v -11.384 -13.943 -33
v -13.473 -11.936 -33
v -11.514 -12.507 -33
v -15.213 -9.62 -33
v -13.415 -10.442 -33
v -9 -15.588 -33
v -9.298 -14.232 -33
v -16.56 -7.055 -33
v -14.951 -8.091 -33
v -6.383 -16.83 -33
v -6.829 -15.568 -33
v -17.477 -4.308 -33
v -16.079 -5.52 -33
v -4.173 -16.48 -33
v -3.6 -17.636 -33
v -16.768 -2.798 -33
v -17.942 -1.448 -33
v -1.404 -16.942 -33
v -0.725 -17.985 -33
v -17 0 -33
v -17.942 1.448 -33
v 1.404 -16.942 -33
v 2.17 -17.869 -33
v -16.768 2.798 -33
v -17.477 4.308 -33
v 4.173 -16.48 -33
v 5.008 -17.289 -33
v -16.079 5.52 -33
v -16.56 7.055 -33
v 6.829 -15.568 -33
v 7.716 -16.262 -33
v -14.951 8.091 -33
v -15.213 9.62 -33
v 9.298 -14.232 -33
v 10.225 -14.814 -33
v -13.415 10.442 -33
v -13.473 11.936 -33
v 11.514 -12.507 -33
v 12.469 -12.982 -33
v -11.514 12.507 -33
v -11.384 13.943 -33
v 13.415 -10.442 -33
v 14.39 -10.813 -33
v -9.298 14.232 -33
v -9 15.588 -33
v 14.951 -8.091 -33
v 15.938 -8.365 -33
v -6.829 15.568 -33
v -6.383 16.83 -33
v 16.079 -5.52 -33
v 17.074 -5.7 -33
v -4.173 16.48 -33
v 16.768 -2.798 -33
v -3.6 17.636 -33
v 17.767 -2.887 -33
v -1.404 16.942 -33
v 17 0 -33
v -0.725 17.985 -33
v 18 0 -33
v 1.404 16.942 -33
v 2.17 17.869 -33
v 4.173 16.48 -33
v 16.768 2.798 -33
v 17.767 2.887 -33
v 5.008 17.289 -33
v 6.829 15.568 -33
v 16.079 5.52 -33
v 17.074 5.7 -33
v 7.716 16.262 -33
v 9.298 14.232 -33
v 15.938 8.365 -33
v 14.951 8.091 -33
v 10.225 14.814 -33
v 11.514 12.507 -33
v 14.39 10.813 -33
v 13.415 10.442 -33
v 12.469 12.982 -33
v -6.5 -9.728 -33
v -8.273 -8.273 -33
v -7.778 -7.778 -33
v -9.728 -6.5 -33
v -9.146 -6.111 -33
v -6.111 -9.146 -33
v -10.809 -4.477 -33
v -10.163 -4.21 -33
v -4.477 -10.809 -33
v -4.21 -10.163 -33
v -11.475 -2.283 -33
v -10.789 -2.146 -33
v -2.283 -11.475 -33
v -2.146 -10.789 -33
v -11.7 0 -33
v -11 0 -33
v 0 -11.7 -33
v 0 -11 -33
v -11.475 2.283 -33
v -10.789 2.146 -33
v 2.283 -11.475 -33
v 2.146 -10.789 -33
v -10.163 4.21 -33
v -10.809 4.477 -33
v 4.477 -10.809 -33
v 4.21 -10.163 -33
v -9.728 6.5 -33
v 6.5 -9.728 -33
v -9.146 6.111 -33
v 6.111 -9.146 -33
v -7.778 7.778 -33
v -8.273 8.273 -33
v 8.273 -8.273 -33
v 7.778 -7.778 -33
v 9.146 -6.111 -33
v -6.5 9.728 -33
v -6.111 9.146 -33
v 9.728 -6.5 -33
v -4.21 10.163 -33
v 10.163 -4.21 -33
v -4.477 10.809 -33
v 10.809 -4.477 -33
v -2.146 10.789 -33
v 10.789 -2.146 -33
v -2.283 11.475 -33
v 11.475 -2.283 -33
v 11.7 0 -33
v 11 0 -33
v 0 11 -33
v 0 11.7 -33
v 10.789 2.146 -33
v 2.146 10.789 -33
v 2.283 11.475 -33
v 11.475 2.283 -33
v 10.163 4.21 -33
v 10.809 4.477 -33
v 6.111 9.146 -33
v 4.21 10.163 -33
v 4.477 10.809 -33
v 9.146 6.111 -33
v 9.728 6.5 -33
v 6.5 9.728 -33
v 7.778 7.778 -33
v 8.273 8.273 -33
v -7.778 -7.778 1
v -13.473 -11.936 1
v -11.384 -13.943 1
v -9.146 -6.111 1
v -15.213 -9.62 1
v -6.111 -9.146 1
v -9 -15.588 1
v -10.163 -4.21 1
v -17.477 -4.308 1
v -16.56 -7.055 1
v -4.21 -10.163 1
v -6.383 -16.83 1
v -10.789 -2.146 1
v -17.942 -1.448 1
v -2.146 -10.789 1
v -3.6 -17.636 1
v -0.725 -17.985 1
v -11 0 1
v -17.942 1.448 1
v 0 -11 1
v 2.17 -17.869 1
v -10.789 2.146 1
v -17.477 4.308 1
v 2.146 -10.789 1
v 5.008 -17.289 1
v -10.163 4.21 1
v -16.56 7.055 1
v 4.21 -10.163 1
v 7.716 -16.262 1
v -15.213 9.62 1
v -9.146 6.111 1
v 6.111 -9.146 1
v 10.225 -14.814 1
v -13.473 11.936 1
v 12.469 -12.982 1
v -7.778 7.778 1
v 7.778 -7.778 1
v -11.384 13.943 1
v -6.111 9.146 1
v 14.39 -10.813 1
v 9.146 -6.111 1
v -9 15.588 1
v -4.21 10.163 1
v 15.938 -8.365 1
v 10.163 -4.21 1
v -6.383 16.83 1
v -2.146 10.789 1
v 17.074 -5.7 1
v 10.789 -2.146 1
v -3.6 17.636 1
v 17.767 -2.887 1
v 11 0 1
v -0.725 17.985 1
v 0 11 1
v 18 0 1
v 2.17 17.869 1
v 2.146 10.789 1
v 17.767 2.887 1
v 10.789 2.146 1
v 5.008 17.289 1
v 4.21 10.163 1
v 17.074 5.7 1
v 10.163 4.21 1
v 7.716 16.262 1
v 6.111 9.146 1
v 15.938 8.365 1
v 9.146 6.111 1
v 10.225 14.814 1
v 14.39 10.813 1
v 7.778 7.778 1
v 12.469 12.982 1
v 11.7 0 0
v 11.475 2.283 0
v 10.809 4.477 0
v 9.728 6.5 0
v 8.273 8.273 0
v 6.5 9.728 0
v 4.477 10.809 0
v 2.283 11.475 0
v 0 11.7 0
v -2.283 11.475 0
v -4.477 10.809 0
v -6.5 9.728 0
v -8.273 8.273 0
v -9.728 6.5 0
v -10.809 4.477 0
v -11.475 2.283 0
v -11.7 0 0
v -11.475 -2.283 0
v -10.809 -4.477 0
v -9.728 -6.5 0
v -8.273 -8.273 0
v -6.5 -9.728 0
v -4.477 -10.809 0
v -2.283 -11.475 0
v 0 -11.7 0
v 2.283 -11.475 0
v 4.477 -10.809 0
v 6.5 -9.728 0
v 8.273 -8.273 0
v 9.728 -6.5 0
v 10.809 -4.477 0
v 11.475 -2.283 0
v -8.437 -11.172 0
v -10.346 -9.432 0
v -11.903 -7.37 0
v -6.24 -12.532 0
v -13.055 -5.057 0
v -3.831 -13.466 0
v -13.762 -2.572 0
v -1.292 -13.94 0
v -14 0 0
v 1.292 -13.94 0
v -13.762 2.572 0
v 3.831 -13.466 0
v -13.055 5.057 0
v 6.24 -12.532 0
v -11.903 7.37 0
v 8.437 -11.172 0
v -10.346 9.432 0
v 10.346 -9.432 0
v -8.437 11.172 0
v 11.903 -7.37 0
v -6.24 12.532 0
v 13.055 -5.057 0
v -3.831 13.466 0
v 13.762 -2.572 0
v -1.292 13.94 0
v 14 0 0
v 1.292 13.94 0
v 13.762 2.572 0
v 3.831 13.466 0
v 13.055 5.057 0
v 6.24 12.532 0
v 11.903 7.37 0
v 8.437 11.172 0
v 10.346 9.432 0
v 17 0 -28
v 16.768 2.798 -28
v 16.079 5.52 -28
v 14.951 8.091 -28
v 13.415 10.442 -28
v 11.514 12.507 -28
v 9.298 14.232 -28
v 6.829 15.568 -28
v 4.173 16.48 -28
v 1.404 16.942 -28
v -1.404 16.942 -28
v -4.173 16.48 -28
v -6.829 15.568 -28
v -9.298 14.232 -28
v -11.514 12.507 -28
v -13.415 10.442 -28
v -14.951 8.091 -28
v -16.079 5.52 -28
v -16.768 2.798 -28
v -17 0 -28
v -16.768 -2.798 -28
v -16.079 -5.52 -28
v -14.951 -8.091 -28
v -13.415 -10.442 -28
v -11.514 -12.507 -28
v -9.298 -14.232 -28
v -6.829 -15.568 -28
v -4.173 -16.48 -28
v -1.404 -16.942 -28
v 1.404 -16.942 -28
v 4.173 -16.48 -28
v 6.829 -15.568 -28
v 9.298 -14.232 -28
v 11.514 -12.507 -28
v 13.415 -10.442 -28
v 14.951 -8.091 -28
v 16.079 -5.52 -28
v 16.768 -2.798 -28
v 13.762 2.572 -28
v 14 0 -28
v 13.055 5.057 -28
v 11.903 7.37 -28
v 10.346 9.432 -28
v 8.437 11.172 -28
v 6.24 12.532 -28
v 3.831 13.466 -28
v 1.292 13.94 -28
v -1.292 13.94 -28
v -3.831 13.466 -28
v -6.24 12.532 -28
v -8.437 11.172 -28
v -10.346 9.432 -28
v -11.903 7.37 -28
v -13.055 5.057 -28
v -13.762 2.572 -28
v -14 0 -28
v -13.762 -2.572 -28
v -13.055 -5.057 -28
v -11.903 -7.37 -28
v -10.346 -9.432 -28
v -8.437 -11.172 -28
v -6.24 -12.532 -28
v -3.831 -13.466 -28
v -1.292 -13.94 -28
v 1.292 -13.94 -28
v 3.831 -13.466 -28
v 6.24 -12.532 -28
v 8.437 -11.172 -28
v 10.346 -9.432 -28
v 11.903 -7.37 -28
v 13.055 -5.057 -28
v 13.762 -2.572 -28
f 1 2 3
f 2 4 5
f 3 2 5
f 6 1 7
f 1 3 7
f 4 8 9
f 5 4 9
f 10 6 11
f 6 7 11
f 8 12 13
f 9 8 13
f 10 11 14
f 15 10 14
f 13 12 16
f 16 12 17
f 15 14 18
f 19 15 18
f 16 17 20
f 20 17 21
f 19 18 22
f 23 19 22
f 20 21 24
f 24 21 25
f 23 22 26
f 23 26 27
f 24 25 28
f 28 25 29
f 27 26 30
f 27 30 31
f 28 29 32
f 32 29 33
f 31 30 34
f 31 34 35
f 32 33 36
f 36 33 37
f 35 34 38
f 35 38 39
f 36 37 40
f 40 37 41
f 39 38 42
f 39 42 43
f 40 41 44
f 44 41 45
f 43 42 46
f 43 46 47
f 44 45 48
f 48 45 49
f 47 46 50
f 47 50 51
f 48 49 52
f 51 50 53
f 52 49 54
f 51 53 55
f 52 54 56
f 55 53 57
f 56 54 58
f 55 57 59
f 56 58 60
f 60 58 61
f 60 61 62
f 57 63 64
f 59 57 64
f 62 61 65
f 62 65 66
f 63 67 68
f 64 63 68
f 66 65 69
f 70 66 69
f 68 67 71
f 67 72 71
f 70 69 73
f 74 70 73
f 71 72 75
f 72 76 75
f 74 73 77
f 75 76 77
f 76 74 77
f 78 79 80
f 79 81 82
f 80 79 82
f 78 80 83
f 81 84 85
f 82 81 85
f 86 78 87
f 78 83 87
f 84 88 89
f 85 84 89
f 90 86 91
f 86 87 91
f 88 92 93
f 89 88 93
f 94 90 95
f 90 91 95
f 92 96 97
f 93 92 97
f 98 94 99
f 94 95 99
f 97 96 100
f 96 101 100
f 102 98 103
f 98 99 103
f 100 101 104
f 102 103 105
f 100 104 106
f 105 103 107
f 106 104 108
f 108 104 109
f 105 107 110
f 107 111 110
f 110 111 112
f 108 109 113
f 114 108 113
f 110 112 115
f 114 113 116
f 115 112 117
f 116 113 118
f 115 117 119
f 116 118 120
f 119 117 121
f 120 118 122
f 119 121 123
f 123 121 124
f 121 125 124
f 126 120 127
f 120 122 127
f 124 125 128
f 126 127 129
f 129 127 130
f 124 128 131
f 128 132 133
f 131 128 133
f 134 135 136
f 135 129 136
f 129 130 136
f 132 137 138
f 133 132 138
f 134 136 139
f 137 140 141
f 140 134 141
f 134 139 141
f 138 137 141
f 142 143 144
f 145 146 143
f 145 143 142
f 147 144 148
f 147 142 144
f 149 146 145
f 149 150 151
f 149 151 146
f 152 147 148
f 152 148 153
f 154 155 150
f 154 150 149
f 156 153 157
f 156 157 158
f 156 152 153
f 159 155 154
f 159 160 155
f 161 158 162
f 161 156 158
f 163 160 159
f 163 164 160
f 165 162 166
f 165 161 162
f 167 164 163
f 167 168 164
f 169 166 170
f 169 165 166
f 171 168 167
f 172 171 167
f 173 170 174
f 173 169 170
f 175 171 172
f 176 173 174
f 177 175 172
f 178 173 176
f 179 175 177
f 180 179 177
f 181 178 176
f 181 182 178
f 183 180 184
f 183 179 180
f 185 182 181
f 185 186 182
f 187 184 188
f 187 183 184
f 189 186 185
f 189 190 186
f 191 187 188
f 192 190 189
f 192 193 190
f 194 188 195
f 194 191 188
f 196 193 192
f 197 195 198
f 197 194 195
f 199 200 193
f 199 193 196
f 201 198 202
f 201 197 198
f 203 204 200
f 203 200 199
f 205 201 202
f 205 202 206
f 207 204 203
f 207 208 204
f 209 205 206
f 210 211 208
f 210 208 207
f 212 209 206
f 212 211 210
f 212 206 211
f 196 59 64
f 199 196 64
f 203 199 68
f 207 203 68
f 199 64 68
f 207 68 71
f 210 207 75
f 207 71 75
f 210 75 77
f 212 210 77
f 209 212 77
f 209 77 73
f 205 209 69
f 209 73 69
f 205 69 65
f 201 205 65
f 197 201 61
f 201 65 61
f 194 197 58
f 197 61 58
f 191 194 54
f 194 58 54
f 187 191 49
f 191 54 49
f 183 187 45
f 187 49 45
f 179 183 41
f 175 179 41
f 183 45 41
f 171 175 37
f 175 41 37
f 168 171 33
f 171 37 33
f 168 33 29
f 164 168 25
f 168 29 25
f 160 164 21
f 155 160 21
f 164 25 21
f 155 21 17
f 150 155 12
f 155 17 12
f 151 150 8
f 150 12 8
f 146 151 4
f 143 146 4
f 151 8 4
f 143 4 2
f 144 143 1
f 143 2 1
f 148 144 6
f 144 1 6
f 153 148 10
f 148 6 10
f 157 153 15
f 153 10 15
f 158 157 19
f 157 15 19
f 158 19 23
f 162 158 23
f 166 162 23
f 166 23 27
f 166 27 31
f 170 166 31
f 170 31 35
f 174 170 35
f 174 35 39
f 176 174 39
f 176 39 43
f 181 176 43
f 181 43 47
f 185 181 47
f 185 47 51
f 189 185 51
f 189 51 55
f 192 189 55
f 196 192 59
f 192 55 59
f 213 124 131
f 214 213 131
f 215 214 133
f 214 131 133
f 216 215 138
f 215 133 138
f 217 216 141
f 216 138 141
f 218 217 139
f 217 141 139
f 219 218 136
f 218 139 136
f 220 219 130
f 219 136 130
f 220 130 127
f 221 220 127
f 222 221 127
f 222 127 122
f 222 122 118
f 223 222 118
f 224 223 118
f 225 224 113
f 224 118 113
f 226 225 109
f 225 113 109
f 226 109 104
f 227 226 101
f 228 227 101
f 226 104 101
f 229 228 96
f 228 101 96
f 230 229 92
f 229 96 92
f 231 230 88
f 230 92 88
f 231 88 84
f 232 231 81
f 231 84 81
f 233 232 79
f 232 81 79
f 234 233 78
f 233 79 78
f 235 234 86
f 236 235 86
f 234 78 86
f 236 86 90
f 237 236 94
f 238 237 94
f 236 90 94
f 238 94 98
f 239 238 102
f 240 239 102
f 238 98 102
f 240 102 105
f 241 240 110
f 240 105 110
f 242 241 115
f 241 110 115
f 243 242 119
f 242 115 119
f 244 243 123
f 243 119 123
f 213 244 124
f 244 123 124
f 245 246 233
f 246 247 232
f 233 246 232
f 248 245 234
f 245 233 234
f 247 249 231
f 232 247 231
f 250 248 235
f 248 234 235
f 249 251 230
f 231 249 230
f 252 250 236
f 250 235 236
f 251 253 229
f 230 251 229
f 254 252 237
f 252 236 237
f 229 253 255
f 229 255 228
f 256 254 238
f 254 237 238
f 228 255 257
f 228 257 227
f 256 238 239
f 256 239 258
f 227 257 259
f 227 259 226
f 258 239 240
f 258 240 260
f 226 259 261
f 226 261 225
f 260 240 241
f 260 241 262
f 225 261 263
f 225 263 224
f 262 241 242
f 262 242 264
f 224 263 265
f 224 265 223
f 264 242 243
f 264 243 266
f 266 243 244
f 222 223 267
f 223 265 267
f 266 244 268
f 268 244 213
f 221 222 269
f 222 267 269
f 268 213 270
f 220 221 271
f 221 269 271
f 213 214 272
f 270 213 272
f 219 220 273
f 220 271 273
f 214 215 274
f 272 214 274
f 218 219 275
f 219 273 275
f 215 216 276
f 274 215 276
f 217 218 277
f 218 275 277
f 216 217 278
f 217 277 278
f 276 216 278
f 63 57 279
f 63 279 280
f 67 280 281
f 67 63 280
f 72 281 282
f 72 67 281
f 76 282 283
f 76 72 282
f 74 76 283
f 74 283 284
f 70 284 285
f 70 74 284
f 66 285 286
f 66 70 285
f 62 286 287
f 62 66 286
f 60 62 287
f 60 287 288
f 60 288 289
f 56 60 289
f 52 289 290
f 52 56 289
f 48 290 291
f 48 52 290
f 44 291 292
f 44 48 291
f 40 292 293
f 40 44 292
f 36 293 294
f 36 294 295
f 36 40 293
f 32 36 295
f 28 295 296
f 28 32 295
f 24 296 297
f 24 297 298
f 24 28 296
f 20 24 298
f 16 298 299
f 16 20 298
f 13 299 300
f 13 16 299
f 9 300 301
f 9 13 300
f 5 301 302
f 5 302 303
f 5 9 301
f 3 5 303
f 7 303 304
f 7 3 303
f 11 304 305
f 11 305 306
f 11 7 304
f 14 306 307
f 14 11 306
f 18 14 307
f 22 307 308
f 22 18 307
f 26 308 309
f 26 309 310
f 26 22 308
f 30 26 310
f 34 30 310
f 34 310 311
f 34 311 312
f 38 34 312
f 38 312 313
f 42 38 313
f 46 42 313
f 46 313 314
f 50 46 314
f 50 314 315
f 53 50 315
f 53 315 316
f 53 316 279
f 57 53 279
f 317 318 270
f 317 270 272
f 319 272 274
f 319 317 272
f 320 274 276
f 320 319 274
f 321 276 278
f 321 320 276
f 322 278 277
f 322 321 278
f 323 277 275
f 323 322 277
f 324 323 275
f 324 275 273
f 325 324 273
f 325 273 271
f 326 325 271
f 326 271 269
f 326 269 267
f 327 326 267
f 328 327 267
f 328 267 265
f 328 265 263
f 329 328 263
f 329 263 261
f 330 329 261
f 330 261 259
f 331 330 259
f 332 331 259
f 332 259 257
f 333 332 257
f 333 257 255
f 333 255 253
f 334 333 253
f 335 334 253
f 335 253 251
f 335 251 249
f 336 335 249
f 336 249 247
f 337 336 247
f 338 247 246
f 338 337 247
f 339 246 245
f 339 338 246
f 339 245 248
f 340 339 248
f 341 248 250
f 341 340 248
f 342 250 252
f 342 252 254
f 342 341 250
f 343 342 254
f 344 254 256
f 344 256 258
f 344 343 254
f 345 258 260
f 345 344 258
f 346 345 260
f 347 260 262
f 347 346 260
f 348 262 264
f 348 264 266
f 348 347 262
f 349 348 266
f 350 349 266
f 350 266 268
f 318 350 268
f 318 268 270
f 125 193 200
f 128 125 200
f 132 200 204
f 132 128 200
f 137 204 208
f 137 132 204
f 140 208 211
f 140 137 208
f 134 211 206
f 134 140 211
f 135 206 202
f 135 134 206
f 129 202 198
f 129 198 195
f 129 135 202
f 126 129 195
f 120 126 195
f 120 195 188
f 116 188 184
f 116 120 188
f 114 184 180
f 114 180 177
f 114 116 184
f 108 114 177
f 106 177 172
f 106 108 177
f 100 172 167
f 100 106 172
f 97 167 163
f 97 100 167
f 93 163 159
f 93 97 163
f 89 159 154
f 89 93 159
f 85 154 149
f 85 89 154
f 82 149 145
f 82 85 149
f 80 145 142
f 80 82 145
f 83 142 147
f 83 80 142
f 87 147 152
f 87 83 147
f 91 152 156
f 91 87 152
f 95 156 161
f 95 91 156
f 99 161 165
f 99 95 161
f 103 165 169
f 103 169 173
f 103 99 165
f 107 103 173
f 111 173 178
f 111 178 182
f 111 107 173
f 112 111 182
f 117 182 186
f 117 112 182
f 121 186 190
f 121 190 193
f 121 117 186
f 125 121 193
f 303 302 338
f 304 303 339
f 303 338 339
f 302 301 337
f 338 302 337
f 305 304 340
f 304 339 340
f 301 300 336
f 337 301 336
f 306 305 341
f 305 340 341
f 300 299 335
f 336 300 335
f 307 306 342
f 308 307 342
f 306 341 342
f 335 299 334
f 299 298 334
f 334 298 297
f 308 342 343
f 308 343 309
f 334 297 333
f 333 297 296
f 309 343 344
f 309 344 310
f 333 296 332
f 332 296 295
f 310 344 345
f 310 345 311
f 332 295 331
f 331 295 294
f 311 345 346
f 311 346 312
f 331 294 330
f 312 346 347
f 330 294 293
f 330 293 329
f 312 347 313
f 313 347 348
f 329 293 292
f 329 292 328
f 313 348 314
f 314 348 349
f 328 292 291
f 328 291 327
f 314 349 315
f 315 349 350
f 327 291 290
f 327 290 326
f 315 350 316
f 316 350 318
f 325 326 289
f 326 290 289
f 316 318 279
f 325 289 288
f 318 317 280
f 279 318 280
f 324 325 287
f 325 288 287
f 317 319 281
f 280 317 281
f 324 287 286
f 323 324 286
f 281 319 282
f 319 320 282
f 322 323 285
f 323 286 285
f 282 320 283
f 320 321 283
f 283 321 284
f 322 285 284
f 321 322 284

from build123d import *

# Parameters (mm, degrees)
CYLINDER093_R     = 1.5
CYLINDER093_DEPTH = 14
CYLINDER090_R     = 11.7
CYLINDER090_DEPTH = 33
CYLINDER094_R     = 1.5
CYLINDER094_DEPTH = 14
CYLINDER088_R     = 14
CYLINDER088_DEPTH = 33
BOX016_W          = 1
BOX016_H          = 1
BOX016_DEPTH      = 1
CYLINDER084_R     = 17
CYLINDER084_DEPTH = 5
CYLINDER095_R     = 11
CYLINDER095_DEPTH = 34
CYLINDER_R        = 18
CYLINDER_DEPTH    = 34


with BuildPart() as ftinsmount1:
    # Cylinder093 → Cylinder093 (new body)
    with BuildSketch(Plane(origin=(53.66, 148, -15), x_dir=(1, 0, 0), z_dir=(0, 0, 1))):
        Circle(CYLINDER093_R)
    extrude(amount=CYLINDER093_DEPTH)


with BuildPart() as ftinsinnerhole:
    # Cylinder090 → Cylinder090 (new body)
    with BuildSketch(Plane(origin=(73.66, 148, -10), x_dir=(1, 0, 0), z_dir=(0, 0, 1))):
        Circle(CYLINDER090_R)
    extrude(amount=CYLINDER090_DEPTH)


with BuildPart() as fusion039:
    # Cylinder094 → Cylinder094 (new body)
    with BuildSketch(Plane(origin=(93.66, 148, -14), x_dir=(1, 0, 0), z_dir=(0, 0, 1))):
        Circle(CYLINDER094_R)
    extrude(amount=CYLINDER094_DEPTH)

    # Fusion039: union FTInsMount1, FTInsInnerHole
    add(ftinsmount1.part)
    add(ftinsinnerhole.part)


with BuildPart() as feedthrough008:
    # Cylinder088 → Cylinder088 (new body)
    with BuildSketch(Plane(origin=(73.66, 148, -10), x_dir=(1, 0, 0), z_dir=(0, 0, 1))):
        Circle(CYLINDER088_R)
    extrude(amount=CYLINDER088_DEPTH)


with BuildPart() as ftinslug:
    # Box016 → Box016 (new body)
    with BuildSketch(Plane(origin=(63, 136, -8), x_dir=(1, 0, 0), z_dir=(0, 0, 1))):
        with Locations((0.5, 0.5)):
            Rectangle(BOX016_W, BOX016_H)
    extrude(amount=BOX016_DEPTH)


with BuildPart() as ftinsulator1:
    # Cylinder084 → Cylinder084 (new body)
    with BuildSketch(Plane(origin=(73.66, 148, -10), x_dir=(1, 0, 0), z_dir=(0, 0, 1))):
        Circle(CYLINDER084_R)
    extrude(amount=CYLINDER084_DEPTH)

    # Fusion038: union Feedthrough008, FTInsLug
    add(feedthrough008.part)
    add(ftinslug.part)

    # Cut010: cut Fusion039
    add(fusion039.part, mode=Mode.SUBTRACT)


with BuildPart() as ftinsulator1_1:
    # Cut010 placement: moved
    add(ftinsulator1.part.moved(Location((-73.66, -148, -23))))


with BuildPart() as fusion:
    # Cylinder095 → Cylinder095 (new body)
    with BuildSketch(Plane.XY.offset(-33)):
        Circle(CYLINDER095_R)
    extrude(amount=CYLINDER095_DEPTH)

    # Fusion: union FTInsulator1
    add(ftinsulator1_1.part)


with BuildPart() as cut:
    # Cylinder → Cylinder (new body)
    with BuildSketch(Plane.XY.offset(-33)):
        Circle(CYLINDER_R)
    extrude(amount=CYLINDER_DEPTH)

    # Cut: cut Fusion
    add(fusion.part, mode=Mode.SUBTRACT)


solid = cut.part
